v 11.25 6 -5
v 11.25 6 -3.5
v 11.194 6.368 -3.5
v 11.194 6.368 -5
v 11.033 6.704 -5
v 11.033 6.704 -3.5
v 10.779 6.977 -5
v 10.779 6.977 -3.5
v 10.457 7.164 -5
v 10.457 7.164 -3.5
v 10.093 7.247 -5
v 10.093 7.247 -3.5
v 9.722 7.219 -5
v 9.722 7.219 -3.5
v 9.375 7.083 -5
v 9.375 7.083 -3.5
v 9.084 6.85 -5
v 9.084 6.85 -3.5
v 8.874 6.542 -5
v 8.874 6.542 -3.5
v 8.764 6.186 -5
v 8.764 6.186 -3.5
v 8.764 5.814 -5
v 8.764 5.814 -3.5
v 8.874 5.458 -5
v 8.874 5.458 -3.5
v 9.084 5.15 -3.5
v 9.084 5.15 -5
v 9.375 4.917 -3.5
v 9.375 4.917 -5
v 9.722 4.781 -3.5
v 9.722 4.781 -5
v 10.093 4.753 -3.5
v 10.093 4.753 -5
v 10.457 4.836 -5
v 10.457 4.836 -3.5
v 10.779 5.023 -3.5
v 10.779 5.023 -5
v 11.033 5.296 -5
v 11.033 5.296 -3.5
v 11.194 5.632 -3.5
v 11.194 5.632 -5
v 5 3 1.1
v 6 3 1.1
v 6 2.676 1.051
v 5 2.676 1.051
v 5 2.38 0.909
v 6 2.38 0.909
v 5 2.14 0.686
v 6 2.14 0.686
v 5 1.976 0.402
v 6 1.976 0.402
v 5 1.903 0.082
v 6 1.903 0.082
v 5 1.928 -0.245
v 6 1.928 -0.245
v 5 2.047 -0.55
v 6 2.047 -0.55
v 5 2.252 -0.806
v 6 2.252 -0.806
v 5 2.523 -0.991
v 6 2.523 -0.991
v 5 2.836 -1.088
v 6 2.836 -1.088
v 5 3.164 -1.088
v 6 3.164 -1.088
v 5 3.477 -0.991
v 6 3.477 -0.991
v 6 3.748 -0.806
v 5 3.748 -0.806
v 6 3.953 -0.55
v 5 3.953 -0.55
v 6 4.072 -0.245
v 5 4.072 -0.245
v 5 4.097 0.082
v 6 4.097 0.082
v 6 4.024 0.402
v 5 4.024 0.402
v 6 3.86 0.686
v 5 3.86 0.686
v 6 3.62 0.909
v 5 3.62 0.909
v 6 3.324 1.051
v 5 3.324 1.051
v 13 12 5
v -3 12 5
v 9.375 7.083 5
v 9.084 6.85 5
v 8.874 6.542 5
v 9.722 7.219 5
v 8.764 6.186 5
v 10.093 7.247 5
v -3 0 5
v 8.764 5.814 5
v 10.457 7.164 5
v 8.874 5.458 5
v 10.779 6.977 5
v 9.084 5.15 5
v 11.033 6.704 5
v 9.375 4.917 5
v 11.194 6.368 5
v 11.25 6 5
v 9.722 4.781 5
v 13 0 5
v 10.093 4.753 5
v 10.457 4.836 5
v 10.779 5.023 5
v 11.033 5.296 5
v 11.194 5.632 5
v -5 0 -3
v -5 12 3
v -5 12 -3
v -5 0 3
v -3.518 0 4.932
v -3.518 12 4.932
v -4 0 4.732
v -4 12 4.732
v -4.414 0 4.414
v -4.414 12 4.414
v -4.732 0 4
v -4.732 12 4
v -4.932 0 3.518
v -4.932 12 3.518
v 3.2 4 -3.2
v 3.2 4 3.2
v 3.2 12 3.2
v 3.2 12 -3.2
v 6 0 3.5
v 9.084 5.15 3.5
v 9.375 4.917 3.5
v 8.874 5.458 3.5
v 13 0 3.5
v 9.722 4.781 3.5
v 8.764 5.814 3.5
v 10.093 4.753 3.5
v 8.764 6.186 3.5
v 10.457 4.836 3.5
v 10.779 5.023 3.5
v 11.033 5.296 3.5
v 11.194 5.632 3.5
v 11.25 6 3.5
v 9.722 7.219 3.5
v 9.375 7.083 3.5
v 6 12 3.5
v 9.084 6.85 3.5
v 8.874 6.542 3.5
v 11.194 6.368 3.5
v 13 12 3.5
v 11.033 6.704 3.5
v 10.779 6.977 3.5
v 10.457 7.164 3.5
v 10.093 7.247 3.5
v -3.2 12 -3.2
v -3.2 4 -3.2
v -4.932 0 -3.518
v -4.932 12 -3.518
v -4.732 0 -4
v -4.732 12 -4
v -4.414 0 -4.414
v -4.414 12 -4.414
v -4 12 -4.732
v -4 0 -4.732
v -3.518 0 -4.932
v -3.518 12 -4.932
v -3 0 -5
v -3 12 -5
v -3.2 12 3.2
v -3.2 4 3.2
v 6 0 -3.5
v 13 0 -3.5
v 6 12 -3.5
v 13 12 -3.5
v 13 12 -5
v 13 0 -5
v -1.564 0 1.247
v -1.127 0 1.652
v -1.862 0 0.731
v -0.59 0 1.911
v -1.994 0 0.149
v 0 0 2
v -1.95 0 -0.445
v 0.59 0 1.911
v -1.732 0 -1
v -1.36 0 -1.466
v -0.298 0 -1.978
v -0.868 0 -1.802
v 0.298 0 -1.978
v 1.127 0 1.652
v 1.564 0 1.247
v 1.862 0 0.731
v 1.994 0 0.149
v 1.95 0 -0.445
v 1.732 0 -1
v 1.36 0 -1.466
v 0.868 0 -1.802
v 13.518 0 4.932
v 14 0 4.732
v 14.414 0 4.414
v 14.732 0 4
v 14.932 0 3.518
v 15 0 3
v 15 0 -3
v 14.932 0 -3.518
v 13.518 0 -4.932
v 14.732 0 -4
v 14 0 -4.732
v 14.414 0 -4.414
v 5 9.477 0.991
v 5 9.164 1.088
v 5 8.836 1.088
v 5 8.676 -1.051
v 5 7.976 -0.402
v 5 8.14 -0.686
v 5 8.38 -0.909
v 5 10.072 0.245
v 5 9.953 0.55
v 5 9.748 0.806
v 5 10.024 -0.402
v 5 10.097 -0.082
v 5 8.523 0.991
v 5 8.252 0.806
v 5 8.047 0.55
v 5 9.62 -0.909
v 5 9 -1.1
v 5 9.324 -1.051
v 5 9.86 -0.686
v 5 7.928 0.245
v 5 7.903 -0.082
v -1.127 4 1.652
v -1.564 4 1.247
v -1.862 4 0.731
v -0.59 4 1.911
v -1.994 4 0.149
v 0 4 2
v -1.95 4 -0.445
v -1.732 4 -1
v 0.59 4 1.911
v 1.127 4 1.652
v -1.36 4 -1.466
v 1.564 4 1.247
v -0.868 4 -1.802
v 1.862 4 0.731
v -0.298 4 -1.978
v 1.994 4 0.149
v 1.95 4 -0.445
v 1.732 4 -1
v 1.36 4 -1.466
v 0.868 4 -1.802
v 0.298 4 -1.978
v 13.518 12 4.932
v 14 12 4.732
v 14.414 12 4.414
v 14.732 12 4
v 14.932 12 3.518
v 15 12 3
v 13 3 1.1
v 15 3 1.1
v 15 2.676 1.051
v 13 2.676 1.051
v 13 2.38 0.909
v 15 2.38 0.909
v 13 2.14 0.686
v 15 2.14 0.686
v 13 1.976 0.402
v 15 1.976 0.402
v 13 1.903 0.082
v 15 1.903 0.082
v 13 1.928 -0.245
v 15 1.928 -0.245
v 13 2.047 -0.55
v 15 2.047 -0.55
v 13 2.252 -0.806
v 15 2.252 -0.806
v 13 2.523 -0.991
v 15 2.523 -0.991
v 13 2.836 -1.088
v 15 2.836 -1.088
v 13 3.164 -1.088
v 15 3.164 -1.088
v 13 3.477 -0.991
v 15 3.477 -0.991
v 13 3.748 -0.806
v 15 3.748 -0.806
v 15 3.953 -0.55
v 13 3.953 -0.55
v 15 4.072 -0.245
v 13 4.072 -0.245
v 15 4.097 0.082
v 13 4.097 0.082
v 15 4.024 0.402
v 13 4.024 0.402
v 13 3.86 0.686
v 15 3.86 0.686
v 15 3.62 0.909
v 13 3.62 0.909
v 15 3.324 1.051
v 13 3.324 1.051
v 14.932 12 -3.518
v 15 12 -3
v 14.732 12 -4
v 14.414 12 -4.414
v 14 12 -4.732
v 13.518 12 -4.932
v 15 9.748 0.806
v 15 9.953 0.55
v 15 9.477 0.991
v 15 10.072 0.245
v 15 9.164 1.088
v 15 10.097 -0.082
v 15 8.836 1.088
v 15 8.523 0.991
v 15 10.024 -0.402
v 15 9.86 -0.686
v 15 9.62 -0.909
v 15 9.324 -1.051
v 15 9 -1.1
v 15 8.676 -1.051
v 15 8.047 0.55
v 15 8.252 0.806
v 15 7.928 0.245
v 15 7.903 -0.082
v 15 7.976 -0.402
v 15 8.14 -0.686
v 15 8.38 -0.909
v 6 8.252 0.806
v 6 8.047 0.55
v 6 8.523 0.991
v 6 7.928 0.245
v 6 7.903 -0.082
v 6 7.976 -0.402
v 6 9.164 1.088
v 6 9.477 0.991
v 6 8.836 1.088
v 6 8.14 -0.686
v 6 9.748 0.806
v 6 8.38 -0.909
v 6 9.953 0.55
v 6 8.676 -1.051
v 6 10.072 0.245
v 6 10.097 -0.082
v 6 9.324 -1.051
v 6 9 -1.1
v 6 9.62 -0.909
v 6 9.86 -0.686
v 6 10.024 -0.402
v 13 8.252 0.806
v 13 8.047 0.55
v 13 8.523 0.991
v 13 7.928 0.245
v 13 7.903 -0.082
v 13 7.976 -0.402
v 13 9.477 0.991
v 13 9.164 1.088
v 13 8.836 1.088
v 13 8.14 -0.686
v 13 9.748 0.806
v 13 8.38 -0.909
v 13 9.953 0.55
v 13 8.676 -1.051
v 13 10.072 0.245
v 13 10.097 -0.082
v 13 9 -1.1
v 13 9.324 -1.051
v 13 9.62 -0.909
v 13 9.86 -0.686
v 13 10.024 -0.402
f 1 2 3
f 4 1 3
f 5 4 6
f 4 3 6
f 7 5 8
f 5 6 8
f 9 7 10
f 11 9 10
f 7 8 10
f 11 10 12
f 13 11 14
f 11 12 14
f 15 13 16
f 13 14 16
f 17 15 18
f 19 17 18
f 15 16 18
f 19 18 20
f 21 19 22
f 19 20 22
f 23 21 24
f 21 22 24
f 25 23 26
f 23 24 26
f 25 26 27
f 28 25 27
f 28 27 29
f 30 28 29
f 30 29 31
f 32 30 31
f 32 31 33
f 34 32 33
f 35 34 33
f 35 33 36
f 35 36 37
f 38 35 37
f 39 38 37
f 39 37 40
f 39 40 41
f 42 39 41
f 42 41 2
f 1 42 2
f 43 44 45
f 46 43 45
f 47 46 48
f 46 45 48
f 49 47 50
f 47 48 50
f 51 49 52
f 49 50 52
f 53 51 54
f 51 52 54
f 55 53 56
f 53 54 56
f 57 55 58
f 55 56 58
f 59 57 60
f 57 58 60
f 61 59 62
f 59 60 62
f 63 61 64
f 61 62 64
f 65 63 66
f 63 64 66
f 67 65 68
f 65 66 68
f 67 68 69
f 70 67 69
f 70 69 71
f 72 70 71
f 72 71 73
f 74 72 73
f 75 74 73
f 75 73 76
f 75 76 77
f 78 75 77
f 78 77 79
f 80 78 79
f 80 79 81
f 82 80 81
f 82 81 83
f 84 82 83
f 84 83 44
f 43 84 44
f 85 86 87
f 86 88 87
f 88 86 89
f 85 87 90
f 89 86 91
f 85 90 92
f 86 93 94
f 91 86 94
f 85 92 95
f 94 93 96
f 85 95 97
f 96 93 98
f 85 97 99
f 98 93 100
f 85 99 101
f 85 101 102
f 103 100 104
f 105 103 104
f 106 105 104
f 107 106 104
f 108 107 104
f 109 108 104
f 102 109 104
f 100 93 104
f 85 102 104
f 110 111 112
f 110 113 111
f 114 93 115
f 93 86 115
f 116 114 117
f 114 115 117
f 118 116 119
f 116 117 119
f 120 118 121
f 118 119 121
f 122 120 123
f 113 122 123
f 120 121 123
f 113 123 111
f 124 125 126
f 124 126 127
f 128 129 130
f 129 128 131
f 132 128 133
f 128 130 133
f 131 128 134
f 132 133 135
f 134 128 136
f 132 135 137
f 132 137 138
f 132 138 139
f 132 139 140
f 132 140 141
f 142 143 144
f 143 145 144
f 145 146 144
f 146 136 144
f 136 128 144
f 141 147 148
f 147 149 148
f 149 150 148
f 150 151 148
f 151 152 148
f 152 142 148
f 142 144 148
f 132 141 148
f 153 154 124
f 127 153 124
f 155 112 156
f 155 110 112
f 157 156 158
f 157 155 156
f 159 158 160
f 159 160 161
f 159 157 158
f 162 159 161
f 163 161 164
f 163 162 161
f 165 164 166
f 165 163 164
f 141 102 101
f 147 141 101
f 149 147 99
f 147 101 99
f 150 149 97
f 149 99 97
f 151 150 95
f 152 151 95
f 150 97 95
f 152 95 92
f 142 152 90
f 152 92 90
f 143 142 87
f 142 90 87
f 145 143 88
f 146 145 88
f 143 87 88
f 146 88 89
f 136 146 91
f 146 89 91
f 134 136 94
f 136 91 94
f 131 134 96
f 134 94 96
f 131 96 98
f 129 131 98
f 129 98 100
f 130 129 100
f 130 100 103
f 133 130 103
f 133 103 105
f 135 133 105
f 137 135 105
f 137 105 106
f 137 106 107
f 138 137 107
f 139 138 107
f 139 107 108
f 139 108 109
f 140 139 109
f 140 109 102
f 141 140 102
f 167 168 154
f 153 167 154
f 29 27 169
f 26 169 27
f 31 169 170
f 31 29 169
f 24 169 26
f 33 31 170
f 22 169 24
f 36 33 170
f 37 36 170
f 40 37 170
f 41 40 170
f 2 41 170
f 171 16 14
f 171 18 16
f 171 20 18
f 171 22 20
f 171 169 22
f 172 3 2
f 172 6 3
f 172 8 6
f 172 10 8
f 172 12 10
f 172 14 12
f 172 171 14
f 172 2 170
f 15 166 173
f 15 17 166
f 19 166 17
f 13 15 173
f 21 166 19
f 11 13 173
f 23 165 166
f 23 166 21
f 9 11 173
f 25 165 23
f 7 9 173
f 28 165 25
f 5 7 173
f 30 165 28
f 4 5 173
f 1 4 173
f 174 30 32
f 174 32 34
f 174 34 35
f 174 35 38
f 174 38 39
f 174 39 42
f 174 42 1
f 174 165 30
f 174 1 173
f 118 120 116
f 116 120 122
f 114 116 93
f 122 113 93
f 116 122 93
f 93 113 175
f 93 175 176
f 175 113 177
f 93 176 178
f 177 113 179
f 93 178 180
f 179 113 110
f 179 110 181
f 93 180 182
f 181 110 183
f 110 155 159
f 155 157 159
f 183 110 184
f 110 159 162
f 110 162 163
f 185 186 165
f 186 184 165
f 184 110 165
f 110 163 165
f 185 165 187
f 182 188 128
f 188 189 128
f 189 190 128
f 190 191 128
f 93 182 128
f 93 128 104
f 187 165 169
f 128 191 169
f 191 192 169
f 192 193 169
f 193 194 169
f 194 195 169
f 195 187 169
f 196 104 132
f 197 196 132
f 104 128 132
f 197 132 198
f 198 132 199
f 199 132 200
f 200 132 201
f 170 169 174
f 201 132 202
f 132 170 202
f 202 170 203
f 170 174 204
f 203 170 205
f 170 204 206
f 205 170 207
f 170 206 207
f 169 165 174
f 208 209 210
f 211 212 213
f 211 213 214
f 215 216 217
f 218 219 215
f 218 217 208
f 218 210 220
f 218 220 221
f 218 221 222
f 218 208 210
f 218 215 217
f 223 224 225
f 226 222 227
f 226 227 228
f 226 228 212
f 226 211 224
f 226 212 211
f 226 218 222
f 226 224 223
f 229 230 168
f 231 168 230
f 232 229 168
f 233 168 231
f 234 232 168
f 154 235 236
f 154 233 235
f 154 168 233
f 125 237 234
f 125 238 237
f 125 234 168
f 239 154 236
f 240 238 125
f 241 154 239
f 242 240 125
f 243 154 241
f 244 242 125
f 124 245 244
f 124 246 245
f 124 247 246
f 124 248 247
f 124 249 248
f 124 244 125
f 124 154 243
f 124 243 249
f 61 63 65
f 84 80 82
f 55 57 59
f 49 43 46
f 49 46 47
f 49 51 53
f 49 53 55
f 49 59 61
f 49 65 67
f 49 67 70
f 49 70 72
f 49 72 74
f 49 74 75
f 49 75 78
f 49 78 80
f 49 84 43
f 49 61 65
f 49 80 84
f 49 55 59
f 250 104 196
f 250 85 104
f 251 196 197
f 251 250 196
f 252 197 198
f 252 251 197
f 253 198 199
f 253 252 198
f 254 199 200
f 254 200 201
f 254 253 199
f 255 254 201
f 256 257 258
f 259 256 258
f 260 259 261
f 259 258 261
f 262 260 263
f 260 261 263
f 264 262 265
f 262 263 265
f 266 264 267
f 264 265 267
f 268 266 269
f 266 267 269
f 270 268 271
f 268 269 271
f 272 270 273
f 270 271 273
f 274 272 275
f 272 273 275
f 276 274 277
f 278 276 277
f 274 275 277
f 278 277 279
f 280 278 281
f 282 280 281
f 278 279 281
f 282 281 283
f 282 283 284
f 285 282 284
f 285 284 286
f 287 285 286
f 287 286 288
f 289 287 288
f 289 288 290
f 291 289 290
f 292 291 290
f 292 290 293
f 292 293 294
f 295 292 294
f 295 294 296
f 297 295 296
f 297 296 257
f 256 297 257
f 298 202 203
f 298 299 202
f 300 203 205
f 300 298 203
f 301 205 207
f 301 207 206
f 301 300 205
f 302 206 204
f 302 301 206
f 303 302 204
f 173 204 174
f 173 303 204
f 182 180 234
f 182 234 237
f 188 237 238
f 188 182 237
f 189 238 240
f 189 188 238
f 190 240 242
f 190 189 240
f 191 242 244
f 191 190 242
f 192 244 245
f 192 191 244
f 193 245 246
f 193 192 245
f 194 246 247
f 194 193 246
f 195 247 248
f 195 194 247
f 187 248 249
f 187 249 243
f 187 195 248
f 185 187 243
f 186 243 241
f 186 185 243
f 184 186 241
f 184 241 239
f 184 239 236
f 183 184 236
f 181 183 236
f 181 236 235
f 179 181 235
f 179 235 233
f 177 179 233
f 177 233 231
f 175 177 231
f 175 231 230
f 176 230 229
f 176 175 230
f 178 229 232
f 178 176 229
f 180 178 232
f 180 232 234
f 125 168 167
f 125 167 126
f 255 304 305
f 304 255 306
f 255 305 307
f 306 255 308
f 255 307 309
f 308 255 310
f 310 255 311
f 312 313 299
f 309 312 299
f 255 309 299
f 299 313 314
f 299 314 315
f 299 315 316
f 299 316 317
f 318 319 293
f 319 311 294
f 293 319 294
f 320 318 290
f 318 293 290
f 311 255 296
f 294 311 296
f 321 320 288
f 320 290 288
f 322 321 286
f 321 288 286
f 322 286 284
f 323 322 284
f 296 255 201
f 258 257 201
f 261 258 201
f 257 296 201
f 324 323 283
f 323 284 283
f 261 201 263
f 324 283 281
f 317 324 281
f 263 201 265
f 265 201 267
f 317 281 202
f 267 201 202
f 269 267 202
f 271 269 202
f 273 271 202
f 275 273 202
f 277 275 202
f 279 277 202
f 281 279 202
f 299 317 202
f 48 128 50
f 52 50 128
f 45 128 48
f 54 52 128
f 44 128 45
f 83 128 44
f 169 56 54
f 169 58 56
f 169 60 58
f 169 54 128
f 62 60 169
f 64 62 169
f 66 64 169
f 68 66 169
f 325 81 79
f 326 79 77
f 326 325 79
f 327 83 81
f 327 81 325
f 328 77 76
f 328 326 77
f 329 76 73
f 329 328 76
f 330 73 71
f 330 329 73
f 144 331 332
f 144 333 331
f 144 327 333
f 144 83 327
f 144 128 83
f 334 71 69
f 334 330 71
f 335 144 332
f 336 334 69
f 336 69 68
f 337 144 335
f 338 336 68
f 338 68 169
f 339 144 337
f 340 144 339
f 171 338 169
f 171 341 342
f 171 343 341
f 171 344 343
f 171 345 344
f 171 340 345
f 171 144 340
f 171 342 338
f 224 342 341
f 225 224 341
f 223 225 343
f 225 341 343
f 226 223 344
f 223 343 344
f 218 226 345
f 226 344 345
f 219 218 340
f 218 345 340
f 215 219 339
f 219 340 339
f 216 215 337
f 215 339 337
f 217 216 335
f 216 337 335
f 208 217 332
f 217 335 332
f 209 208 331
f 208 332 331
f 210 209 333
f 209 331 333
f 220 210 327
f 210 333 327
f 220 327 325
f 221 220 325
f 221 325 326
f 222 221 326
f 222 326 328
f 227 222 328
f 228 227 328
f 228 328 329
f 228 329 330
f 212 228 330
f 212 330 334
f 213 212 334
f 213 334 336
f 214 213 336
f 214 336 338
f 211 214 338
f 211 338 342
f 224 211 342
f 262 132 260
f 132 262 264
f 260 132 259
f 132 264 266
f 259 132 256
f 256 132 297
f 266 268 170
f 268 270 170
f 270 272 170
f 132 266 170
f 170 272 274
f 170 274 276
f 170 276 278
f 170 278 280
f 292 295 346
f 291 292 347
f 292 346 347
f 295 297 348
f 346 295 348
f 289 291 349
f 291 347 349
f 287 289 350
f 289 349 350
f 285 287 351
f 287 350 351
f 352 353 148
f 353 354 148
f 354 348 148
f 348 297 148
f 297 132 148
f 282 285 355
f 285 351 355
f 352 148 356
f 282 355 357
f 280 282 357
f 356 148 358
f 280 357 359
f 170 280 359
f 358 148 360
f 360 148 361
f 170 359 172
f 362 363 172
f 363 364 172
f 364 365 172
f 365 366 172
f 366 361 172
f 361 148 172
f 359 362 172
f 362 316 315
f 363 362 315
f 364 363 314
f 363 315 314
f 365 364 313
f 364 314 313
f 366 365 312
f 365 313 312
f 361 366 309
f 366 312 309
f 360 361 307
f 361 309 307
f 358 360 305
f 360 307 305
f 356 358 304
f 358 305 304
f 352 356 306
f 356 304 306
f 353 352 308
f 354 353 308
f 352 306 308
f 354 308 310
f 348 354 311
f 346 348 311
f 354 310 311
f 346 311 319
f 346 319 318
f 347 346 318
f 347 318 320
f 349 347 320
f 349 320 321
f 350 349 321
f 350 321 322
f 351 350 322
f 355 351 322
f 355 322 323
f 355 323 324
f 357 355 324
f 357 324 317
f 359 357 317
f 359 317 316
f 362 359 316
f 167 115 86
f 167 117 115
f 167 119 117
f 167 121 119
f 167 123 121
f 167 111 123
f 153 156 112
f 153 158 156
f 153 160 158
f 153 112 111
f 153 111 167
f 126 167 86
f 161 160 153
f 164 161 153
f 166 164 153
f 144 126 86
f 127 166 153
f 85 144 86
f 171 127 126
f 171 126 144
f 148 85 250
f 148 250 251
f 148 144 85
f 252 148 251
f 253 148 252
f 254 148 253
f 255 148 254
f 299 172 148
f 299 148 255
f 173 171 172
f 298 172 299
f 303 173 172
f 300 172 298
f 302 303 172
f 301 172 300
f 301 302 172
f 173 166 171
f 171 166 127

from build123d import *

# Parameters (mm, degrees)
SKETCH2_W           = 10
SKETCH2_H           = 10
SKETCH2_R           = 2
BOSS_EXTRUDE1_DEPTH = 4
SKETCH2_3_W         = 10
SKETCH2_3_H         = 10
SKETCH2_3_W_2       = 6.4
SKETCH2_3_H_2       = 6.4
BOSS_EXTRUDE2_DEPTH = 12
SKETCH2_4_W         = 10
SKETCH2_4_H         = 10
BOSS_EXTRUDE3_DEPTH = 12
SKETCH3_R           = 1.25
CUT_EXTRUDE1_DEPTH  = 12
SKETCH4_R           = 1.1
CUT_EXTRUDE2_DEPTH  = 10
FILLET1_R           = 2
SKETCH5_W           = 7
SKETCH5_H           = 7
CUT_EXTRUDE3_DEPTH  = 14


with BuildPart() as part:
    # Sketch2 → Boss-Extrude1 (new body)
    with BuildSketch(Plane(origin=(0, 0, 0), x_dir=(1, 0, 0), z_dir=(0, 1, 0))):
        Rectangle(SKETCH2_W, SKETCH2_H)
        Circle(SKETCH2_R, mode=Mode.SUBTRACT)
    extrude(amount=BOSS_EXTRUDE1_DEPTH)

    # Sketch2<3> → Boss-Extrude2 (add)
    with BuildSketch(Plane(origin=(0, 0, 0), x_dir=(1, 0, 0), z_dir=(0, 1, 0))):
        Rectangle(SKETCH2_3_W, SKETCH2_3_H)
        Rectangle(SKETCH2_3_W_2, SKETCH2_3_H_2, mode=Mode.SUBTRACT)
    extrude(amount=BOSS_EXTRUDE2_DEPTH)

    # Sketch2<4> → Boss-Extrude3 (add)
    with BuildSketch(Plane(origin=(0, 0, 0), x_dir=(1, 0, 0), z_dir=(0, 1, 0))):
        with Locations((10, 0)):
            Rectangle(SKETCH2_4_W, SKETCH2_4_H)
    extrude(amount=BOSS_EXTRUDE3_DEPTH)

    # Sketch3 → Cut-Extrude1 (cut)
    with BuildSketch(Plane.XY.offset(5)):
        with Locations((10, 6)):
            Circle(SKETCH3_R)
    extrude(amount=-CUT_EXTRUDE1_DEPTH, mode=Mode.SUBTRACT)

    # Sketch4 → Cut-Extrude2 (cut)
    with BuildSketch(Plane(origin=(15, 0, 0), x_dir=(0, 0, -1), z_dir=(1, 0, 0))):
        with Locations((0, 9)):
            Circle(SKETCH4_R)
        with Locations((0, 3)):
            Circle(SKETCH4_R)
    extrude(amount=-CUT_EXTRUDE2_DEPTH, mode=Mode.SUBTRACT)

    # Fillet1
    fillet1_edges = [part.edges().sort_by_distance(p)[0] for p in [
        (-5, 6, 5),
        (-5, 6, -5),
        (15, 6, -5),
        (15, 6, 5),
    ]]
    fillet(fillet1_edges, radius=FILLET1_R)

    # Sketch5 → Cut-Extrude3 (cut)
    with BuildSketch(Plane(origin=(0, 12, 0), x_dir=(1, 0, 0), z_dir=(0, 1, 0))):
        with Locations((9.5, 0)):
            Rectangle(SKETCH5_W, SKETCH5_H)
    extrude(amount=-CUT_EXTRUDE3_DEPTH, mode=Mode.SUBTRACT)


solid = part.part
